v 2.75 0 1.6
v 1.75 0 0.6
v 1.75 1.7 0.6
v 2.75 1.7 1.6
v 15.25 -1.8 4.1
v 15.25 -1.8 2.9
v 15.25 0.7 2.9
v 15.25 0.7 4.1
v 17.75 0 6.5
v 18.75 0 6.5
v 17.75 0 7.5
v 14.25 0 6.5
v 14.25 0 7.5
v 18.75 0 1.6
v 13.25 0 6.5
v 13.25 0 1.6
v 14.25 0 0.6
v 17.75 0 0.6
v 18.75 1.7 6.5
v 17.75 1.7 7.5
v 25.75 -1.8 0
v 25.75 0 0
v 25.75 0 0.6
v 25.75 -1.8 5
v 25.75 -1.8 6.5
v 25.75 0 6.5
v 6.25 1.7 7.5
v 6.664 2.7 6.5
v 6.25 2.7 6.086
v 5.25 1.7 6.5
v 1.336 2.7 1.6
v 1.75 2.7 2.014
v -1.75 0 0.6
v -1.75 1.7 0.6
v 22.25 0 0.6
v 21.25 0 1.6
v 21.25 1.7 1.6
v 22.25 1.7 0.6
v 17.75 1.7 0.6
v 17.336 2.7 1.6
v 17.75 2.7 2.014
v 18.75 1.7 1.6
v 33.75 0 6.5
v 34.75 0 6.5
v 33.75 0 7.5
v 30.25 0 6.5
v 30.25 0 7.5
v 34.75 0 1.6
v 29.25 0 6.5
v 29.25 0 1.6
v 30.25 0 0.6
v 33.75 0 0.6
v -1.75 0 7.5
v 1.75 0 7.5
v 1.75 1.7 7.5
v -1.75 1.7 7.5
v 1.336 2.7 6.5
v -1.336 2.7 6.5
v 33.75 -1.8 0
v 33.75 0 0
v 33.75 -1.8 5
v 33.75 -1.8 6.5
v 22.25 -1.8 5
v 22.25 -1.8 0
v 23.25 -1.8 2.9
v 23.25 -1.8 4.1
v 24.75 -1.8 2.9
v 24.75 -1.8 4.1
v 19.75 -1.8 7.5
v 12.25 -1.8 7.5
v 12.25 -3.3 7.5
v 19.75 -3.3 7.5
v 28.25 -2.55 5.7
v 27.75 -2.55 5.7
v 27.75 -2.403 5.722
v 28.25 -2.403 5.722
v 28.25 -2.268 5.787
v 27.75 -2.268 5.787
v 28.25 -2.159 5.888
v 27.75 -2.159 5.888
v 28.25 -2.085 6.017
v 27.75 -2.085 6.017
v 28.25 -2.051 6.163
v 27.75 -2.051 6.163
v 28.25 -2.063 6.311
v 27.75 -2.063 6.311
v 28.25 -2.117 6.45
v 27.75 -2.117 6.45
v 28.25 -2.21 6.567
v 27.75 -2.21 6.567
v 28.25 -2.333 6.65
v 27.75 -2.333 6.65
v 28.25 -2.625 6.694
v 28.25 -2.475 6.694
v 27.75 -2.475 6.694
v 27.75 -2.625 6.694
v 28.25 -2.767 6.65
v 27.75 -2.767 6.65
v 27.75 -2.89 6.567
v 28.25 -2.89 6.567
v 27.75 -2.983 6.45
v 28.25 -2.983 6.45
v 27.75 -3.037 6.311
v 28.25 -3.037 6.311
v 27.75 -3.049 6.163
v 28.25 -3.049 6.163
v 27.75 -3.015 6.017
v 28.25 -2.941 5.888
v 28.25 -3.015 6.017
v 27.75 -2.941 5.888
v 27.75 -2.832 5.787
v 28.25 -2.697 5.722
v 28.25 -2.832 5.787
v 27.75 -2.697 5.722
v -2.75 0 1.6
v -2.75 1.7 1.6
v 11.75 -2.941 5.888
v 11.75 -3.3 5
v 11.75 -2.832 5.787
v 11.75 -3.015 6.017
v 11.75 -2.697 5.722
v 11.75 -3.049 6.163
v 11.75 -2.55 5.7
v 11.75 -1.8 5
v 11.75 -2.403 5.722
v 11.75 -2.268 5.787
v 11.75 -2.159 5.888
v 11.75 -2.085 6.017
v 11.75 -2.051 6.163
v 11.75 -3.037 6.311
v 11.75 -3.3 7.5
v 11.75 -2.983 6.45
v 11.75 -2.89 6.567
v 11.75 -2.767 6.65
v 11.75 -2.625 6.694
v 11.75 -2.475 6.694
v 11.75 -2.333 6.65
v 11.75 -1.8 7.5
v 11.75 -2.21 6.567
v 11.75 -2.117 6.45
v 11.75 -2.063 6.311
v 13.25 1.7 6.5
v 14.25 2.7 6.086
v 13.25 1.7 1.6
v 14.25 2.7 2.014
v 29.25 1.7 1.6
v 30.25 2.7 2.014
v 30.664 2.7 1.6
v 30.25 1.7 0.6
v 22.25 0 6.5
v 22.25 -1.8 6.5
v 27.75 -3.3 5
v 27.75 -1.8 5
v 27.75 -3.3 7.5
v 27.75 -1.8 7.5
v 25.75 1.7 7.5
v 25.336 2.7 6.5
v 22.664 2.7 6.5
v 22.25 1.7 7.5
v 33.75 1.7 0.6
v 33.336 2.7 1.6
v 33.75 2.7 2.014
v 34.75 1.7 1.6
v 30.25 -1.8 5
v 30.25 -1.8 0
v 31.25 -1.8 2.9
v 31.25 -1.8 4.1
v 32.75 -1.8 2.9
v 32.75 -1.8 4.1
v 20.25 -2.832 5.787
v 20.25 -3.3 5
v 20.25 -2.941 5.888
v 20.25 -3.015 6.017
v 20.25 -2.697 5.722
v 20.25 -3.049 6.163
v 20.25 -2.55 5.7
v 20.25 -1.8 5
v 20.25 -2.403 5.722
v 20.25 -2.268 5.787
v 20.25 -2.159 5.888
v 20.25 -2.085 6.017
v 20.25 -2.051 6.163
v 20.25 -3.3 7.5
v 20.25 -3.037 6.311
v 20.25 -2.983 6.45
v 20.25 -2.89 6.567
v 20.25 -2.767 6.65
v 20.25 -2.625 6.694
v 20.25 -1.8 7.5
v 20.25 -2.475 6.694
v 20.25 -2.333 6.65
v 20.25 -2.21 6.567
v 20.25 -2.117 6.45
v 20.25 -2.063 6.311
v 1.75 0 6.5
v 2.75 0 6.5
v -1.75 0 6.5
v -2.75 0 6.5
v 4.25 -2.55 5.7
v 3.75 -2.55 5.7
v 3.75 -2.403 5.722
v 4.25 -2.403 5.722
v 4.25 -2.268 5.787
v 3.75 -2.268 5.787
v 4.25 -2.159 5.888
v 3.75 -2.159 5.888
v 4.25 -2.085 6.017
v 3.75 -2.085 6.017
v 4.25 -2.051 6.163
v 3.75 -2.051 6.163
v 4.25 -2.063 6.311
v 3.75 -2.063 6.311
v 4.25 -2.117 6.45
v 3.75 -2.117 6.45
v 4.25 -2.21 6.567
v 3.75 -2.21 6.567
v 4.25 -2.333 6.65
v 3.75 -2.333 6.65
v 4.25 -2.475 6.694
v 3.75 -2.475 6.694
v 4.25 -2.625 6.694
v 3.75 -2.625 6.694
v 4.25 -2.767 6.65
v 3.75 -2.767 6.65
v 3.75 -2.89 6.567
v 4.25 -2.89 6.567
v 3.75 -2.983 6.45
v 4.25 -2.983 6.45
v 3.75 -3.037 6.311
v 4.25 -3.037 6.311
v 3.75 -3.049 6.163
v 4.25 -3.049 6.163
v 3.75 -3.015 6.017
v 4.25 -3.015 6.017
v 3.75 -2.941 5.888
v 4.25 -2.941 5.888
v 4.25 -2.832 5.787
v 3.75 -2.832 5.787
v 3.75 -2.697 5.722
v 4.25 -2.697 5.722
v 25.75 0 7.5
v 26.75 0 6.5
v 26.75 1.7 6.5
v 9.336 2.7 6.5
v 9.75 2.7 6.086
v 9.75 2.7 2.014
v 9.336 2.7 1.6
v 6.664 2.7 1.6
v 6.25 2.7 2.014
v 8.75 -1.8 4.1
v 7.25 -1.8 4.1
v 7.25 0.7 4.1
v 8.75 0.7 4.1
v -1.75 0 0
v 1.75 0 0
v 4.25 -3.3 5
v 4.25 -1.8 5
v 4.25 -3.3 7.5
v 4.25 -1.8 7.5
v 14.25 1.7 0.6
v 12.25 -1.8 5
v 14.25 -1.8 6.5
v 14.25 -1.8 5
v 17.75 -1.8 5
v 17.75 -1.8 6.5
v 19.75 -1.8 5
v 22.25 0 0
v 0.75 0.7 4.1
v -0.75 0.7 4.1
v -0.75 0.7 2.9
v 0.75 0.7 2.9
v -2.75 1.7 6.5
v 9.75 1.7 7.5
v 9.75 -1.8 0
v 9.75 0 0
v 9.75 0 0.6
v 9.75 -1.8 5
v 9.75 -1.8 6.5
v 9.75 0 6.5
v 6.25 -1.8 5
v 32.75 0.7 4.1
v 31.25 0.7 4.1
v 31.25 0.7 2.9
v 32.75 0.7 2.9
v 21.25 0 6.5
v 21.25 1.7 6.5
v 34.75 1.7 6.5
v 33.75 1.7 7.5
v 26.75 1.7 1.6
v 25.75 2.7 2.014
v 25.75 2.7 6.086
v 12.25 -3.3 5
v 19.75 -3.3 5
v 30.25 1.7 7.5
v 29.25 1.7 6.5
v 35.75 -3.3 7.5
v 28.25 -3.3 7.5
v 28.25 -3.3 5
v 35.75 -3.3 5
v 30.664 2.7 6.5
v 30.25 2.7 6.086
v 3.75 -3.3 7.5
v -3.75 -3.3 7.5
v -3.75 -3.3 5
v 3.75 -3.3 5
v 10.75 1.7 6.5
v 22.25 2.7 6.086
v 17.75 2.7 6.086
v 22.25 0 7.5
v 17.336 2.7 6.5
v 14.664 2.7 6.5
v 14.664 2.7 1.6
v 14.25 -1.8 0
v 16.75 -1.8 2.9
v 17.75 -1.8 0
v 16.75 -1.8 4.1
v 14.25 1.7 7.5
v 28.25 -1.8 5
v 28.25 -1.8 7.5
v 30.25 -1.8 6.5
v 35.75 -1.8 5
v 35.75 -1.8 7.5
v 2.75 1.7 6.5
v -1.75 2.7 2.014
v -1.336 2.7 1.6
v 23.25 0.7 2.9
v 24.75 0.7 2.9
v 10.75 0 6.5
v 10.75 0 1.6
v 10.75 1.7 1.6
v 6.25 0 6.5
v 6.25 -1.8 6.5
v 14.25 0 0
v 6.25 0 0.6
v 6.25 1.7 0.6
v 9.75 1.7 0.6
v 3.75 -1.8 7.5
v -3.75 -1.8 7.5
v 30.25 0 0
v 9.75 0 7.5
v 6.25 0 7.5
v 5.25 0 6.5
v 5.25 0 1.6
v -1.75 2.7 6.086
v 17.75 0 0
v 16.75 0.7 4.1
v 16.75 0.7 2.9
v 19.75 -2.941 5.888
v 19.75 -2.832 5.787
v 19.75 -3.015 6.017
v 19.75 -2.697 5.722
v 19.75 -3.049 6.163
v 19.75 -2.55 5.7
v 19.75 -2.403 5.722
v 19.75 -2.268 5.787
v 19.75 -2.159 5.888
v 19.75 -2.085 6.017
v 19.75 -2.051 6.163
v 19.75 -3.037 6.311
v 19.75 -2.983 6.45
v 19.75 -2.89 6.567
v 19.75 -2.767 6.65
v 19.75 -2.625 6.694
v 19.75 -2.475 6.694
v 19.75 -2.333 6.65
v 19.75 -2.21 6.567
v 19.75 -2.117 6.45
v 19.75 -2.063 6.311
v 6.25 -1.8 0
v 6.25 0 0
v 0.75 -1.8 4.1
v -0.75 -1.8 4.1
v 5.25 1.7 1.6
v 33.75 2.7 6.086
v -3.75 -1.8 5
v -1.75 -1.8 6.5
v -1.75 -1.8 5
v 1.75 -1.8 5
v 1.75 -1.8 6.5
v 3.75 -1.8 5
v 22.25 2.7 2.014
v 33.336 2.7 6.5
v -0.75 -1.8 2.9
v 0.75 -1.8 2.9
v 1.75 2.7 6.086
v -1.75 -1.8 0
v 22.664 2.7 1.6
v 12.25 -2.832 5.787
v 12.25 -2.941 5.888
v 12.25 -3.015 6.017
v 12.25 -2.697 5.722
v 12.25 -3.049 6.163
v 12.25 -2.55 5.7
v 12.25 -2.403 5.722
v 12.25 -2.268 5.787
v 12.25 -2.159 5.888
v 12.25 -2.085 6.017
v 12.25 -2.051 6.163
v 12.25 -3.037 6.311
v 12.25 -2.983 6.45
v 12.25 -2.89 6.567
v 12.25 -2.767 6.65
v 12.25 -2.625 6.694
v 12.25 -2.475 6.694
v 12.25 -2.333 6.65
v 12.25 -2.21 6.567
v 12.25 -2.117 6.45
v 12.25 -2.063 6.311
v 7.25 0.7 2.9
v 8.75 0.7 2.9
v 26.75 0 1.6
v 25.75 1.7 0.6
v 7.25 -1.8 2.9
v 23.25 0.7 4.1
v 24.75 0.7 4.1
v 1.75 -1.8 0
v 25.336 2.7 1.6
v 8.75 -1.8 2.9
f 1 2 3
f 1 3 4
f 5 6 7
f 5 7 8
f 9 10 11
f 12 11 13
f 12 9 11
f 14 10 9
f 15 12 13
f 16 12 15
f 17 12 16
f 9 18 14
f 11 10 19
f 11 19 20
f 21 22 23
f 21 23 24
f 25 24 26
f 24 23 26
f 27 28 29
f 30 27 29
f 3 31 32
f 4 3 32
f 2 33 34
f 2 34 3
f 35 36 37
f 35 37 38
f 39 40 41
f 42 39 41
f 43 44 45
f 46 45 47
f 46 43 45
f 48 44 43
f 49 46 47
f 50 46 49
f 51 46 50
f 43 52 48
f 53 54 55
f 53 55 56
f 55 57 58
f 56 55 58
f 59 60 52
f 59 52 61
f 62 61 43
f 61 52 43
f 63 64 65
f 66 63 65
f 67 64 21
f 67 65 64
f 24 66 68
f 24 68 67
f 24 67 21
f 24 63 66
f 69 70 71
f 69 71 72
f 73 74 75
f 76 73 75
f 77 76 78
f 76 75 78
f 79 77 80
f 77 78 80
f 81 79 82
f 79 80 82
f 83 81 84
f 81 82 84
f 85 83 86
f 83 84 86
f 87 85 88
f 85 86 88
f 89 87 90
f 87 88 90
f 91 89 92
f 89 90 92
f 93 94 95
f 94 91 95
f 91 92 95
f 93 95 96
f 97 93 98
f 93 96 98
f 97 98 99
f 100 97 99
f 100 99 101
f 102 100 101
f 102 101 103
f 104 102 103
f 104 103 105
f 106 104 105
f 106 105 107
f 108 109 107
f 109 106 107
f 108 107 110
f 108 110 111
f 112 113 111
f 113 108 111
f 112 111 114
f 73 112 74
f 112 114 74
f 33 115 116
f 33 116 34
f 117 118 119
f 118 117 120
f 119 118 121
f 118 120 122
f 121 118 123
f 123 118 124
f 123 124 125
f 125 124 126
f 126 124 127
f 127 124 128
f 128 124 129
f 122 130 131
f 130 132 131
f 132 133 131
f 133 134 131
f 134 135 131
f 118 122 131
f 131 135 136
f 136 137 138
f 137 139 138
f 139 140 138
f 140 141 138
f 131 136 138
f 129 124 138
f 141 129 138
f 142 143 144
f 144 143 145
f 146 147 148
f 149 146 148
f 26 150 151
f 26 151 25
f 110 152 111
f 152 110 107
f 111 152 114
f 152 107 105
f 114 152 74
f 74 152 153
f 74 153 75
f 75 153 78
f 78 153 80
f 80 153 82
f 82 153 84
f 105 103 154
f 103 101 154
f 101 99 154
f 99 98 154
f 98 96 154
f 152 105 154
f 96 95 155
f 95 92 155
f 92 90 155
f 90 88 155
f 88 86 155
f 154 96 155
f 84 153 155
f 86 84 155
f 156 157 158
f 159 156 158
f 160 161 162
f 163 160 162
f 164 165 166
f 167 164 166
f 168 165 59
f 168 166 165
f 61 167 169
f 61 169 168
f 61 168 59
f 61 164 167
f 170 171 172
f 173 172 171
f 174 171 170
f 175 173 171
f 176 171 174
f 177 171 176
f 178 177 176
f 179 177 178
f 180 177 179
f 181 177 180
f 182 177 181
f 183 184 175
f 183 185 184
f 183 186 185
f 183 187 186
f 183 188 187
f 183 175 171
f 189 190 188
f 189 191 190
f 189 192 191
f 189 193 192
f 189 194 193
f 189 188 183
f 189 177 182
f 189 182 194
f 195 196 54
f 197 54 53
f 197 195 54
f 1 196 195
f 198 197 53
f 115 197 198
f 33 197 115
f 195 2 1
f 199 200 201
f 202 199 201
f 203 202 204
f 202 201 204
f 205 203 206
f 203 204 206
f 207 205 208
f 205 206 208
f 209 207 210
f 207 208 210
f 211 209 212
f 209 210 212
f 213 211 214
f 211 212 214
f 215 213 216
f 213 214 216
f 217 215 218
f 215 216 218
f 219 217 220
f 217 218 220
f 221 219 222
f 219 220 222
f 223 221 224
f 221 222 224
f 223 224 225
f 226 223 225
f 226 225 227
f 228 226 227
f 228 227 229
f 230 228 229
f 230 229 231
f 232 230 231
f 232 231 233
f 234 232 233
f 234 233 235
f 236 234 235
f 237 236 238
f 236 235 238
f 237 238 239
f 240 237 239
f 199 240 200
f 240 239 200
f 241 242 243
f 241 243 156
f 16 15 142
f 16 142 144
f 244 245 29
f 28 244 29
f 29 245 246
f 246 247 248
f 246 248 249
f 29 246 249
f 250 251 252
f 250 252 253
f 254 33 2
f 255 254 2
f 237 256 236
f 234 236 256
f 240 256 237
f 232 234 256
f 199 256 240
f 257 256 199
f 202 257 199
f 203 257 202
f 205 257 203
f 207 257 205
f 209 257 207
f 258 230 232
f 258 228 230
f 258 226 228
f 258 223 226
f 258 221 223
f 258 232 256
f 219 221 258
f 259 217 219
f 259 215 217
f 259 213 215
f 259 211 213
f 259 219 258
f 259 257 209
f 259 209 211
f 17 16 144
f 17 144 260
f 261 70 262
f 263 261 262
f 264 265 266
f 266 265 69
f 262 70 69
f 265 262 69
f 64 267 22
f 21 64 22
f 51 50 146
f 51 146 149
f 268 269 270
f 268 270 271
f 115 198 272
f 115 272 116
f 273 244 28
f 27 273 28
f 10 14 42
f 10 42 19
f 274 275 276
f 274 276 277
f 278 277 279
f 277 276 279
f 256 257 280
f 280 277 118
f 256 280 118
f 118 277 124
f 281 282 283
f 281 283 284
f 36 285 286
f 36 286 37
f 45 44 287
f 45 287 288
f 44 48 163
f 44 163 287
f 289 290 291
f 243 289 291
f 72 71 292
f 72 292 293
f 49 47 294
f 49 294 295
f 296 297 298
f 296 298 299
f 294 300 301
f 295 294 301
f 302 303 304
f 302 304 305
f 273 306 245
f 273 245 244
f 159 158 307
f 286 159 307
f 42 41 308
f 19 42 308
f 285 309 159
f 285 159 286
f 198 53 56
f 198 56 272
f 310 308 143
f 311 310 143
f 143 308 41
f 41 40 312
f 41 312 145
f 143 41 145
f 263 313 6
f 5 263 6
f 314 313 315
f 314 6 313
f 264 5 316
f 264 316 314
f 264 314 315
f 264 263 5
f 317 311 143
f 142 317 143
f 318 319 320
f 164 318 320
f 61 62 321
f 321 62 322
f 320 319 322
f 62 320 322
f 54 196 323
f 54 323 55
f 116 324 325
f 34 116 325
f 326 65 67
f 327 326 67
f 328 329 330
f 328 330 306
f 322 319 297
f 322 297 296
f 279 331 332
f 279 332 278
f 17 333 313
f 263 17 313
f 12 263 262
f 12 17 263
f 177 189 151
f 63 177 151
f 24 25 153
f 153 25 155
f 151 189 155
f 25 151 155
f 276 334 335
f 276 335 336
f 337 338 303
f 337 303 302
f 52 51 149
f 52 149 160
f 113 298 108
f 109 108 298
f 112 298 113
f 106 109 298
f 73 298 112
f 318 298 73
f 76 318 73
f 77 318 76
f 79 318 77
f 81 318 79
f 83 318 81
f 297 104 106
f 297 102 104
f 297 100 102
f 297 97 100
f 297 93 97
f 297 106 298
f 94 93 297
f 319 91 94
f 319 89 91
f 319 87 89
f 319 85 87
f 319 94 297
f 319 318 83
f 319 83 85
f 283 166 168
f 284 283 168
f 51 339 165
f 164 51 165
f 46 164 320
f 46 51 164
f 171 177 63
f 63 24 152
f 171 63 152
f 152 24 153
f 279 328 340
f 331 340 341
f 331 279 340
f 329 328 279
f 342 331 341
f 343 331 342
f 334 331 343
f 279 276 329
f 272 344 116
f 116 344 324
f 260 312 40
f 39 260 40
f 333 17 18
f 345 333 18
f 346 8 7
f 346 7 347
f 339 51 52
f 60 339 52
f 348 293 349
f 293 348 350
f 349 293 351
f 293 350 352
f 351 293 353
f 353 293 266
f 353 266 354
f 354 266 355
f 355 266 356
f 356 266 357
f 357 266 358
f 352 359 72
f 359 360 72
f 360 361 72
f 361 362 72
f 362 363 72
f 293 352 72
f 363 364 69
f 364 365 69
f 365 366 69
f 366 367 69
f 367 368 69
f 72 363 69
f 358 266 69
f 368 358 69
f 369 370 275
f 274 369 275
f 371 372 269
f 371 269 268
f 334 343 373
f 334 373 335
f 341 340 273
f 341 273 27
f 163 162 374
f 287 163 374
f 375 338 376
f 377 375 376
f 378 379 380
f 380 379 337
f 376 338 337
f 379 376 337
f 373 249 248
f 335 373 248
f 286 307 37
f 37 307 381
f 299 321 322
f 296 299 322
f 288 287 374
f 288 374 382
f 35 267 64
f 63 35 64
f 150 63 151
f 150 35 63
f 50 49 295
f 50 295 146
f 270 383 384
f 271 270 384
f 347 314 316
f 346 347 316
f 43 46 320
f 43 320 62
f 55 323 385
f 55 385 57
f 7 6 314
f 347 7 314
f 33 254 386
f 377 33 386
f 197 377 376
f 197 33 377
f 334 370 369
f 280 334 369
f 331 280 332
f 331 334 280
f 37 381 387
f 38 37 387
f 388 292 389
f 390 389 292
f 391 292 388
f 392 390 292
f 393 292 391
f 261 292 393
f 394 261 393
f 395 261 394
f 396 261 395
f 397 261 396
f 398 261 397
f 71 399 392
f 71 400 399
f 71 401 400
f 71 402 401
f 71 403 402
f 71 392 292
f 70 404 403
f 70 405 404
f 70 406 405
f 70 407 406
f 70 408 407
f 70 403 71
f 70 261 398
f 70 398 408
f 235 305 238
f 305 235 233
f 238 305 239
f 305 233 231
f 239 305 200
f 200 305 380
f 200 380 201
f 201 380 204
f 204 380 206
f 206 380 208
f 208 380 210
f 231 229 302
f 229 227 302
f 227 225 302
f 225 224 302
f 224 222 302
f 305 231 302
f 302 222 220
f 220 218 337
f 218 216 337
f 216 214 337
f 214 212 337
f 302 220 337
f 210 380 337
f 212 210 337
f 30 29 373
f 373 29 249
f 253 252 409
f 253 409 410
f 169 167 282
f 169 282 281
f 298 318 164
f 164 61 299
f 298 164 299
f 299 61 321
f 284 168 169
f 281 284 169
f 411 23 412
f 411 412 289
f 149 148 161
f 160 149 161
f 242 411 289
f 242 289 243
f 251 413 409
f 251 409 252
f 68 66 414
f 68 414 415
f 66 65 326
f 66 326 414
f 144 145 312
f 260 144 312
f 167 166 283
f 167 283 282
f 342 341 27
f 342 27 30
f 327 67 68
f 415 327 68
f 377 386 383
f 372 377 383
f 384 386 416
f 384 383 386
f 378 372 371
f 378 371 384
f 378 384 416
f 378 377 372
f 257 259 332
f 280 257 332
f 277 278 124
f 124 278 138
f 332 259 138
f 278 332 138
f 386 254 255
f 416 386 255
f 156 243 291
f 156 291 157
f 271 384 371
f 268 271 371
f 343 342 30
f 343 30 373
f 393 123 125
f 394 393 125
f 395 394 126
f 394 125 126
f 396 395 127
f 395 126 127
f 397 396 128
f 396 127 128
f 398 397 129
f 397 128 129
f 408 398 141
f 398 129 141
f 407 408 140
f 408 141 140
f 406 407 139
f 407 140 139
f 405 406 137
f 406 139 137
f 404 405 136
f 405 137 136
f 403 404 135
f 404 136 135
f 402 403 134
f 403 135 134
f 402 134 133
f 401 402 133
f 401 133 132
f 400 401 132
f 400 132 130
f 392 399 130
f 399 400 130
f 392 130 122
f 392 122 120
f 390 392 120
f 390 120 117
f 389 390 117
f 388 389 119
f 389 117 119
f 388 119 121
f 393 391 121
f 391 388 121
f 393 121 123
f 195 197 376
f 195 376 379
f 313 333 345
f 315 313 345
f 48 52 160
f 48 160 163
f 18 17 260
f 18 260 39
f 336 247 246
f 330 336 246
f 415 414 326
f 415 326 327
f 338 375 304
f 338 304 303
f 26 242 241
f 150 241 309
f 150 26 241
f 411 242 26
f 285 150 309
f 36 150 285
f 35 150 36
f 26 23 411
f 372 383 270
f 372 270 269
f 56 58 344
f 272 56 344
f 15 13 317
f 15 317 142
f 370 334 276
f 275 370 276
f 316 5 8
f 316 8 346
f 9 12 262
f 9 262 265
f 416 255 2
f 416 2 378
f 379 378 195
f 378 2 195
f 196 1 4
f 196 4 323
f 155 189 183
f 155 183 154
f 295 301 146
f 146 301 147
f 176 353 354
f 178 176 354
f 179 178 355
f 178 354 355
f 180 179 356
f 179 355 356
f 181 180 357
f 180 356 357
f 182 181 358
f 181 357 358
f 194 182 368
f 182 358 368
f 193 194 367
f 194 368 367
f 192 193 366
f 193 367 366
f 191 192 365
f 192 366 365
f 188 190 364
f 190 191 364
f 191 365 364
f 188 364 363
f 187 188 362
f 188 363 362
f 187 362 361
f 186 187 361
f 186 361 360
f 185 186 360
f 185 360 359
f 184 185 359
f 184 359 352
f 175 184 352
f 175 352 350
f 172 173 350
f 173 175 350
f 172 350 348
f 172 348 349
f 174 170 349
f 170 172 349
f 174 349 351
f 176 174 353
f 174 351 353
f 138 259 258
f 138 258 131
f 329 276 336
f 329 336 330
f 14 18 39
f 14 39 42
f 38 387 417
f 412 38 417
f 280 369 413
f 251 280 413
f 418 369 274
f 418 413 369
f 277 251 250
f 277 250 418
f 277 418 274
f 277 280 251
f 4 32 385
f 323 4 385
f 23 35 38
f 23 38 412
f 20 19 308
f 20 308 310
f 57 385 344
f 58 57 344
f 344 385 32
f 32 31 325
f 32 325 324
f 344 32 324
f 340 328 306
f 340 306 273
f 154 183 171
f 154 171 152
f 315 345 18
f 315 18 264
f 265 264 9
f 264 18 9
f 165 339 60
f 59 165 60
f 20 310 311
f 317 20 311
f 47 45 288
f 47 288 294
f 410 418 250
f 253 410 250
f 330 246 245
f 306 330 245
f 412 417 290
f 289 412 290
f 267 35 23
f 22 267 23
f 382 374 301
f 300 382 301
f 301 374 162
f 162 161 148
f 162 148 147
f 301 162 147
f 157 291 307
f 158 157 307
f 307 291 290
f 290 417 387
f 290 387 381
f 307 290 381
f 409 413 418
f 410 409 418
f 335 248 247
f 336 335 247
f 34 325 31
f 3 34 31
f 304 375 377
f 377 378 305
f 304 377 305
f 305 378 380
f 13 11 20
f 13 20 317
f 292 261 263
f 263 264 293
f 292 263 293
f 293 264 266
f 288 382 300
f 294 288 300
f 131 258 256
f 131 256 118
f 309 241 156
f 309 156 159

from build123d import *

# Parameters (mm, degrees)
CYLINDER_R           = 0.5
CYLINDER_DEPTH       = 35
CYLINDER_PITCH_ANGLE = 90
SKETCH_W             = 3.5
SKETCH_H             = 6.5
PAD_DEPTH            = 1.8
PAD001_DEPTH         = 2.7
SKETCH002_W          = 1.5
SKETCH002_H          = 1.2
POCKET_DEPTH         = 2.5
SKETCH003_W          = 7.5
SKETCH003_H          = 2.5
PAD002_DEPTH         = 1.5
CHAMFER_SIZE         = 1
ARRAY_X_COUNT        = 5
ARRAY_X_PITCH        = 8


with BuildPart() as cylinder:
    # Cylinder → Cylinder (new body)
    with BuildSketch(Plane.XY):
        Circle(CYLINDER_R)
    extrude(amount=CYLINDER_DEPTH)


with BuildPart() as cylinder_1:
    # Cylinder pitch: moved
    add(cylinder.part.rotate(Axis((0, 0, 0), (0, 1, 0)), CYLINDER_PITCH_ANGLE))


with BuildPart() as cylinder_2:
    # Cylinder placement: moved
    add(cylinder_1.part.moved(Location((0, -2.55, 6.2))))


with BuildPart() as fusion:
    # Sketch → Pad (new body)
    with BuildSketch(Plane.XZ):
        with Locations((0, 3.25)):
            Rectangle(SKETCH_W, SKETCH_H)
    extrude(amount=PAD_DEPTH)

    # Sketch001 → Pad001 (new body)
    with BuildSketch(Plane(origin=(0, 0, 0), x_dir=(1, 0, 0), z_dir=(0, 1, 0))):
        Polygon((-1.75, -0.6), (1.75, -0.6), (2.75, -1.6), (2.75, -6.5), (1.75, -7.5), (-1.75, -7.5), (-2.75, -6.5), (-2.75, -1.6), align=None)
    extrude(amount=PAD001_DEPTH)

    # Sketch002 → Pocket (cut)
    with BuildSketch(Plane.XZ.offset(1.8)):
        with Locations((0, 3.5)):
            Rectangle(SKETCH002_W, SKETCH002_H)
    extrude(amount=-POCKET_DEPTH, mode=Mode.SUBTRACT)

    # Sketch003 → Pad002 (new body)
    with BuildSketch(Plane.XZ.offset(1.8)):
        with Locations((0, 6.25)):
            Rectangle(SKETCH003_W, SKETCH003_H)
    extrude(amount=PAD002_DEPTH)

    # Chamfer
    chamfer_edges = [fusion.edges().sort_by_distance(p)[0] for p in [
        (-2.75, 2.7, 4.05),
        (-2.25, 2.7, 1.1),
        (0, 2.7, 0.6),
        (2.25, 2.7, 1.1),
        (2.75, 2.7, 4.05),
        (2.25, 2.7, 7),
        (0, 2.7, 7.5),
        (-2.25, 2.7, 7),
    ]]
    chamfer(chamfer_edges, length=CHAMFER_SIZE)

    # Array X: Fusion ×5


with BuildPart() as fusion_1:
    add(fusion.part)
    with Locations(*[(i * ARRAY_X_PITCH, 0, 0) for i in range(1, ARRAY_X_COUNT)]):
        add(fusion.part)

    # Fusion: union Cylinder
    add(cylinder_2.part)


solid = fusion_1.part
